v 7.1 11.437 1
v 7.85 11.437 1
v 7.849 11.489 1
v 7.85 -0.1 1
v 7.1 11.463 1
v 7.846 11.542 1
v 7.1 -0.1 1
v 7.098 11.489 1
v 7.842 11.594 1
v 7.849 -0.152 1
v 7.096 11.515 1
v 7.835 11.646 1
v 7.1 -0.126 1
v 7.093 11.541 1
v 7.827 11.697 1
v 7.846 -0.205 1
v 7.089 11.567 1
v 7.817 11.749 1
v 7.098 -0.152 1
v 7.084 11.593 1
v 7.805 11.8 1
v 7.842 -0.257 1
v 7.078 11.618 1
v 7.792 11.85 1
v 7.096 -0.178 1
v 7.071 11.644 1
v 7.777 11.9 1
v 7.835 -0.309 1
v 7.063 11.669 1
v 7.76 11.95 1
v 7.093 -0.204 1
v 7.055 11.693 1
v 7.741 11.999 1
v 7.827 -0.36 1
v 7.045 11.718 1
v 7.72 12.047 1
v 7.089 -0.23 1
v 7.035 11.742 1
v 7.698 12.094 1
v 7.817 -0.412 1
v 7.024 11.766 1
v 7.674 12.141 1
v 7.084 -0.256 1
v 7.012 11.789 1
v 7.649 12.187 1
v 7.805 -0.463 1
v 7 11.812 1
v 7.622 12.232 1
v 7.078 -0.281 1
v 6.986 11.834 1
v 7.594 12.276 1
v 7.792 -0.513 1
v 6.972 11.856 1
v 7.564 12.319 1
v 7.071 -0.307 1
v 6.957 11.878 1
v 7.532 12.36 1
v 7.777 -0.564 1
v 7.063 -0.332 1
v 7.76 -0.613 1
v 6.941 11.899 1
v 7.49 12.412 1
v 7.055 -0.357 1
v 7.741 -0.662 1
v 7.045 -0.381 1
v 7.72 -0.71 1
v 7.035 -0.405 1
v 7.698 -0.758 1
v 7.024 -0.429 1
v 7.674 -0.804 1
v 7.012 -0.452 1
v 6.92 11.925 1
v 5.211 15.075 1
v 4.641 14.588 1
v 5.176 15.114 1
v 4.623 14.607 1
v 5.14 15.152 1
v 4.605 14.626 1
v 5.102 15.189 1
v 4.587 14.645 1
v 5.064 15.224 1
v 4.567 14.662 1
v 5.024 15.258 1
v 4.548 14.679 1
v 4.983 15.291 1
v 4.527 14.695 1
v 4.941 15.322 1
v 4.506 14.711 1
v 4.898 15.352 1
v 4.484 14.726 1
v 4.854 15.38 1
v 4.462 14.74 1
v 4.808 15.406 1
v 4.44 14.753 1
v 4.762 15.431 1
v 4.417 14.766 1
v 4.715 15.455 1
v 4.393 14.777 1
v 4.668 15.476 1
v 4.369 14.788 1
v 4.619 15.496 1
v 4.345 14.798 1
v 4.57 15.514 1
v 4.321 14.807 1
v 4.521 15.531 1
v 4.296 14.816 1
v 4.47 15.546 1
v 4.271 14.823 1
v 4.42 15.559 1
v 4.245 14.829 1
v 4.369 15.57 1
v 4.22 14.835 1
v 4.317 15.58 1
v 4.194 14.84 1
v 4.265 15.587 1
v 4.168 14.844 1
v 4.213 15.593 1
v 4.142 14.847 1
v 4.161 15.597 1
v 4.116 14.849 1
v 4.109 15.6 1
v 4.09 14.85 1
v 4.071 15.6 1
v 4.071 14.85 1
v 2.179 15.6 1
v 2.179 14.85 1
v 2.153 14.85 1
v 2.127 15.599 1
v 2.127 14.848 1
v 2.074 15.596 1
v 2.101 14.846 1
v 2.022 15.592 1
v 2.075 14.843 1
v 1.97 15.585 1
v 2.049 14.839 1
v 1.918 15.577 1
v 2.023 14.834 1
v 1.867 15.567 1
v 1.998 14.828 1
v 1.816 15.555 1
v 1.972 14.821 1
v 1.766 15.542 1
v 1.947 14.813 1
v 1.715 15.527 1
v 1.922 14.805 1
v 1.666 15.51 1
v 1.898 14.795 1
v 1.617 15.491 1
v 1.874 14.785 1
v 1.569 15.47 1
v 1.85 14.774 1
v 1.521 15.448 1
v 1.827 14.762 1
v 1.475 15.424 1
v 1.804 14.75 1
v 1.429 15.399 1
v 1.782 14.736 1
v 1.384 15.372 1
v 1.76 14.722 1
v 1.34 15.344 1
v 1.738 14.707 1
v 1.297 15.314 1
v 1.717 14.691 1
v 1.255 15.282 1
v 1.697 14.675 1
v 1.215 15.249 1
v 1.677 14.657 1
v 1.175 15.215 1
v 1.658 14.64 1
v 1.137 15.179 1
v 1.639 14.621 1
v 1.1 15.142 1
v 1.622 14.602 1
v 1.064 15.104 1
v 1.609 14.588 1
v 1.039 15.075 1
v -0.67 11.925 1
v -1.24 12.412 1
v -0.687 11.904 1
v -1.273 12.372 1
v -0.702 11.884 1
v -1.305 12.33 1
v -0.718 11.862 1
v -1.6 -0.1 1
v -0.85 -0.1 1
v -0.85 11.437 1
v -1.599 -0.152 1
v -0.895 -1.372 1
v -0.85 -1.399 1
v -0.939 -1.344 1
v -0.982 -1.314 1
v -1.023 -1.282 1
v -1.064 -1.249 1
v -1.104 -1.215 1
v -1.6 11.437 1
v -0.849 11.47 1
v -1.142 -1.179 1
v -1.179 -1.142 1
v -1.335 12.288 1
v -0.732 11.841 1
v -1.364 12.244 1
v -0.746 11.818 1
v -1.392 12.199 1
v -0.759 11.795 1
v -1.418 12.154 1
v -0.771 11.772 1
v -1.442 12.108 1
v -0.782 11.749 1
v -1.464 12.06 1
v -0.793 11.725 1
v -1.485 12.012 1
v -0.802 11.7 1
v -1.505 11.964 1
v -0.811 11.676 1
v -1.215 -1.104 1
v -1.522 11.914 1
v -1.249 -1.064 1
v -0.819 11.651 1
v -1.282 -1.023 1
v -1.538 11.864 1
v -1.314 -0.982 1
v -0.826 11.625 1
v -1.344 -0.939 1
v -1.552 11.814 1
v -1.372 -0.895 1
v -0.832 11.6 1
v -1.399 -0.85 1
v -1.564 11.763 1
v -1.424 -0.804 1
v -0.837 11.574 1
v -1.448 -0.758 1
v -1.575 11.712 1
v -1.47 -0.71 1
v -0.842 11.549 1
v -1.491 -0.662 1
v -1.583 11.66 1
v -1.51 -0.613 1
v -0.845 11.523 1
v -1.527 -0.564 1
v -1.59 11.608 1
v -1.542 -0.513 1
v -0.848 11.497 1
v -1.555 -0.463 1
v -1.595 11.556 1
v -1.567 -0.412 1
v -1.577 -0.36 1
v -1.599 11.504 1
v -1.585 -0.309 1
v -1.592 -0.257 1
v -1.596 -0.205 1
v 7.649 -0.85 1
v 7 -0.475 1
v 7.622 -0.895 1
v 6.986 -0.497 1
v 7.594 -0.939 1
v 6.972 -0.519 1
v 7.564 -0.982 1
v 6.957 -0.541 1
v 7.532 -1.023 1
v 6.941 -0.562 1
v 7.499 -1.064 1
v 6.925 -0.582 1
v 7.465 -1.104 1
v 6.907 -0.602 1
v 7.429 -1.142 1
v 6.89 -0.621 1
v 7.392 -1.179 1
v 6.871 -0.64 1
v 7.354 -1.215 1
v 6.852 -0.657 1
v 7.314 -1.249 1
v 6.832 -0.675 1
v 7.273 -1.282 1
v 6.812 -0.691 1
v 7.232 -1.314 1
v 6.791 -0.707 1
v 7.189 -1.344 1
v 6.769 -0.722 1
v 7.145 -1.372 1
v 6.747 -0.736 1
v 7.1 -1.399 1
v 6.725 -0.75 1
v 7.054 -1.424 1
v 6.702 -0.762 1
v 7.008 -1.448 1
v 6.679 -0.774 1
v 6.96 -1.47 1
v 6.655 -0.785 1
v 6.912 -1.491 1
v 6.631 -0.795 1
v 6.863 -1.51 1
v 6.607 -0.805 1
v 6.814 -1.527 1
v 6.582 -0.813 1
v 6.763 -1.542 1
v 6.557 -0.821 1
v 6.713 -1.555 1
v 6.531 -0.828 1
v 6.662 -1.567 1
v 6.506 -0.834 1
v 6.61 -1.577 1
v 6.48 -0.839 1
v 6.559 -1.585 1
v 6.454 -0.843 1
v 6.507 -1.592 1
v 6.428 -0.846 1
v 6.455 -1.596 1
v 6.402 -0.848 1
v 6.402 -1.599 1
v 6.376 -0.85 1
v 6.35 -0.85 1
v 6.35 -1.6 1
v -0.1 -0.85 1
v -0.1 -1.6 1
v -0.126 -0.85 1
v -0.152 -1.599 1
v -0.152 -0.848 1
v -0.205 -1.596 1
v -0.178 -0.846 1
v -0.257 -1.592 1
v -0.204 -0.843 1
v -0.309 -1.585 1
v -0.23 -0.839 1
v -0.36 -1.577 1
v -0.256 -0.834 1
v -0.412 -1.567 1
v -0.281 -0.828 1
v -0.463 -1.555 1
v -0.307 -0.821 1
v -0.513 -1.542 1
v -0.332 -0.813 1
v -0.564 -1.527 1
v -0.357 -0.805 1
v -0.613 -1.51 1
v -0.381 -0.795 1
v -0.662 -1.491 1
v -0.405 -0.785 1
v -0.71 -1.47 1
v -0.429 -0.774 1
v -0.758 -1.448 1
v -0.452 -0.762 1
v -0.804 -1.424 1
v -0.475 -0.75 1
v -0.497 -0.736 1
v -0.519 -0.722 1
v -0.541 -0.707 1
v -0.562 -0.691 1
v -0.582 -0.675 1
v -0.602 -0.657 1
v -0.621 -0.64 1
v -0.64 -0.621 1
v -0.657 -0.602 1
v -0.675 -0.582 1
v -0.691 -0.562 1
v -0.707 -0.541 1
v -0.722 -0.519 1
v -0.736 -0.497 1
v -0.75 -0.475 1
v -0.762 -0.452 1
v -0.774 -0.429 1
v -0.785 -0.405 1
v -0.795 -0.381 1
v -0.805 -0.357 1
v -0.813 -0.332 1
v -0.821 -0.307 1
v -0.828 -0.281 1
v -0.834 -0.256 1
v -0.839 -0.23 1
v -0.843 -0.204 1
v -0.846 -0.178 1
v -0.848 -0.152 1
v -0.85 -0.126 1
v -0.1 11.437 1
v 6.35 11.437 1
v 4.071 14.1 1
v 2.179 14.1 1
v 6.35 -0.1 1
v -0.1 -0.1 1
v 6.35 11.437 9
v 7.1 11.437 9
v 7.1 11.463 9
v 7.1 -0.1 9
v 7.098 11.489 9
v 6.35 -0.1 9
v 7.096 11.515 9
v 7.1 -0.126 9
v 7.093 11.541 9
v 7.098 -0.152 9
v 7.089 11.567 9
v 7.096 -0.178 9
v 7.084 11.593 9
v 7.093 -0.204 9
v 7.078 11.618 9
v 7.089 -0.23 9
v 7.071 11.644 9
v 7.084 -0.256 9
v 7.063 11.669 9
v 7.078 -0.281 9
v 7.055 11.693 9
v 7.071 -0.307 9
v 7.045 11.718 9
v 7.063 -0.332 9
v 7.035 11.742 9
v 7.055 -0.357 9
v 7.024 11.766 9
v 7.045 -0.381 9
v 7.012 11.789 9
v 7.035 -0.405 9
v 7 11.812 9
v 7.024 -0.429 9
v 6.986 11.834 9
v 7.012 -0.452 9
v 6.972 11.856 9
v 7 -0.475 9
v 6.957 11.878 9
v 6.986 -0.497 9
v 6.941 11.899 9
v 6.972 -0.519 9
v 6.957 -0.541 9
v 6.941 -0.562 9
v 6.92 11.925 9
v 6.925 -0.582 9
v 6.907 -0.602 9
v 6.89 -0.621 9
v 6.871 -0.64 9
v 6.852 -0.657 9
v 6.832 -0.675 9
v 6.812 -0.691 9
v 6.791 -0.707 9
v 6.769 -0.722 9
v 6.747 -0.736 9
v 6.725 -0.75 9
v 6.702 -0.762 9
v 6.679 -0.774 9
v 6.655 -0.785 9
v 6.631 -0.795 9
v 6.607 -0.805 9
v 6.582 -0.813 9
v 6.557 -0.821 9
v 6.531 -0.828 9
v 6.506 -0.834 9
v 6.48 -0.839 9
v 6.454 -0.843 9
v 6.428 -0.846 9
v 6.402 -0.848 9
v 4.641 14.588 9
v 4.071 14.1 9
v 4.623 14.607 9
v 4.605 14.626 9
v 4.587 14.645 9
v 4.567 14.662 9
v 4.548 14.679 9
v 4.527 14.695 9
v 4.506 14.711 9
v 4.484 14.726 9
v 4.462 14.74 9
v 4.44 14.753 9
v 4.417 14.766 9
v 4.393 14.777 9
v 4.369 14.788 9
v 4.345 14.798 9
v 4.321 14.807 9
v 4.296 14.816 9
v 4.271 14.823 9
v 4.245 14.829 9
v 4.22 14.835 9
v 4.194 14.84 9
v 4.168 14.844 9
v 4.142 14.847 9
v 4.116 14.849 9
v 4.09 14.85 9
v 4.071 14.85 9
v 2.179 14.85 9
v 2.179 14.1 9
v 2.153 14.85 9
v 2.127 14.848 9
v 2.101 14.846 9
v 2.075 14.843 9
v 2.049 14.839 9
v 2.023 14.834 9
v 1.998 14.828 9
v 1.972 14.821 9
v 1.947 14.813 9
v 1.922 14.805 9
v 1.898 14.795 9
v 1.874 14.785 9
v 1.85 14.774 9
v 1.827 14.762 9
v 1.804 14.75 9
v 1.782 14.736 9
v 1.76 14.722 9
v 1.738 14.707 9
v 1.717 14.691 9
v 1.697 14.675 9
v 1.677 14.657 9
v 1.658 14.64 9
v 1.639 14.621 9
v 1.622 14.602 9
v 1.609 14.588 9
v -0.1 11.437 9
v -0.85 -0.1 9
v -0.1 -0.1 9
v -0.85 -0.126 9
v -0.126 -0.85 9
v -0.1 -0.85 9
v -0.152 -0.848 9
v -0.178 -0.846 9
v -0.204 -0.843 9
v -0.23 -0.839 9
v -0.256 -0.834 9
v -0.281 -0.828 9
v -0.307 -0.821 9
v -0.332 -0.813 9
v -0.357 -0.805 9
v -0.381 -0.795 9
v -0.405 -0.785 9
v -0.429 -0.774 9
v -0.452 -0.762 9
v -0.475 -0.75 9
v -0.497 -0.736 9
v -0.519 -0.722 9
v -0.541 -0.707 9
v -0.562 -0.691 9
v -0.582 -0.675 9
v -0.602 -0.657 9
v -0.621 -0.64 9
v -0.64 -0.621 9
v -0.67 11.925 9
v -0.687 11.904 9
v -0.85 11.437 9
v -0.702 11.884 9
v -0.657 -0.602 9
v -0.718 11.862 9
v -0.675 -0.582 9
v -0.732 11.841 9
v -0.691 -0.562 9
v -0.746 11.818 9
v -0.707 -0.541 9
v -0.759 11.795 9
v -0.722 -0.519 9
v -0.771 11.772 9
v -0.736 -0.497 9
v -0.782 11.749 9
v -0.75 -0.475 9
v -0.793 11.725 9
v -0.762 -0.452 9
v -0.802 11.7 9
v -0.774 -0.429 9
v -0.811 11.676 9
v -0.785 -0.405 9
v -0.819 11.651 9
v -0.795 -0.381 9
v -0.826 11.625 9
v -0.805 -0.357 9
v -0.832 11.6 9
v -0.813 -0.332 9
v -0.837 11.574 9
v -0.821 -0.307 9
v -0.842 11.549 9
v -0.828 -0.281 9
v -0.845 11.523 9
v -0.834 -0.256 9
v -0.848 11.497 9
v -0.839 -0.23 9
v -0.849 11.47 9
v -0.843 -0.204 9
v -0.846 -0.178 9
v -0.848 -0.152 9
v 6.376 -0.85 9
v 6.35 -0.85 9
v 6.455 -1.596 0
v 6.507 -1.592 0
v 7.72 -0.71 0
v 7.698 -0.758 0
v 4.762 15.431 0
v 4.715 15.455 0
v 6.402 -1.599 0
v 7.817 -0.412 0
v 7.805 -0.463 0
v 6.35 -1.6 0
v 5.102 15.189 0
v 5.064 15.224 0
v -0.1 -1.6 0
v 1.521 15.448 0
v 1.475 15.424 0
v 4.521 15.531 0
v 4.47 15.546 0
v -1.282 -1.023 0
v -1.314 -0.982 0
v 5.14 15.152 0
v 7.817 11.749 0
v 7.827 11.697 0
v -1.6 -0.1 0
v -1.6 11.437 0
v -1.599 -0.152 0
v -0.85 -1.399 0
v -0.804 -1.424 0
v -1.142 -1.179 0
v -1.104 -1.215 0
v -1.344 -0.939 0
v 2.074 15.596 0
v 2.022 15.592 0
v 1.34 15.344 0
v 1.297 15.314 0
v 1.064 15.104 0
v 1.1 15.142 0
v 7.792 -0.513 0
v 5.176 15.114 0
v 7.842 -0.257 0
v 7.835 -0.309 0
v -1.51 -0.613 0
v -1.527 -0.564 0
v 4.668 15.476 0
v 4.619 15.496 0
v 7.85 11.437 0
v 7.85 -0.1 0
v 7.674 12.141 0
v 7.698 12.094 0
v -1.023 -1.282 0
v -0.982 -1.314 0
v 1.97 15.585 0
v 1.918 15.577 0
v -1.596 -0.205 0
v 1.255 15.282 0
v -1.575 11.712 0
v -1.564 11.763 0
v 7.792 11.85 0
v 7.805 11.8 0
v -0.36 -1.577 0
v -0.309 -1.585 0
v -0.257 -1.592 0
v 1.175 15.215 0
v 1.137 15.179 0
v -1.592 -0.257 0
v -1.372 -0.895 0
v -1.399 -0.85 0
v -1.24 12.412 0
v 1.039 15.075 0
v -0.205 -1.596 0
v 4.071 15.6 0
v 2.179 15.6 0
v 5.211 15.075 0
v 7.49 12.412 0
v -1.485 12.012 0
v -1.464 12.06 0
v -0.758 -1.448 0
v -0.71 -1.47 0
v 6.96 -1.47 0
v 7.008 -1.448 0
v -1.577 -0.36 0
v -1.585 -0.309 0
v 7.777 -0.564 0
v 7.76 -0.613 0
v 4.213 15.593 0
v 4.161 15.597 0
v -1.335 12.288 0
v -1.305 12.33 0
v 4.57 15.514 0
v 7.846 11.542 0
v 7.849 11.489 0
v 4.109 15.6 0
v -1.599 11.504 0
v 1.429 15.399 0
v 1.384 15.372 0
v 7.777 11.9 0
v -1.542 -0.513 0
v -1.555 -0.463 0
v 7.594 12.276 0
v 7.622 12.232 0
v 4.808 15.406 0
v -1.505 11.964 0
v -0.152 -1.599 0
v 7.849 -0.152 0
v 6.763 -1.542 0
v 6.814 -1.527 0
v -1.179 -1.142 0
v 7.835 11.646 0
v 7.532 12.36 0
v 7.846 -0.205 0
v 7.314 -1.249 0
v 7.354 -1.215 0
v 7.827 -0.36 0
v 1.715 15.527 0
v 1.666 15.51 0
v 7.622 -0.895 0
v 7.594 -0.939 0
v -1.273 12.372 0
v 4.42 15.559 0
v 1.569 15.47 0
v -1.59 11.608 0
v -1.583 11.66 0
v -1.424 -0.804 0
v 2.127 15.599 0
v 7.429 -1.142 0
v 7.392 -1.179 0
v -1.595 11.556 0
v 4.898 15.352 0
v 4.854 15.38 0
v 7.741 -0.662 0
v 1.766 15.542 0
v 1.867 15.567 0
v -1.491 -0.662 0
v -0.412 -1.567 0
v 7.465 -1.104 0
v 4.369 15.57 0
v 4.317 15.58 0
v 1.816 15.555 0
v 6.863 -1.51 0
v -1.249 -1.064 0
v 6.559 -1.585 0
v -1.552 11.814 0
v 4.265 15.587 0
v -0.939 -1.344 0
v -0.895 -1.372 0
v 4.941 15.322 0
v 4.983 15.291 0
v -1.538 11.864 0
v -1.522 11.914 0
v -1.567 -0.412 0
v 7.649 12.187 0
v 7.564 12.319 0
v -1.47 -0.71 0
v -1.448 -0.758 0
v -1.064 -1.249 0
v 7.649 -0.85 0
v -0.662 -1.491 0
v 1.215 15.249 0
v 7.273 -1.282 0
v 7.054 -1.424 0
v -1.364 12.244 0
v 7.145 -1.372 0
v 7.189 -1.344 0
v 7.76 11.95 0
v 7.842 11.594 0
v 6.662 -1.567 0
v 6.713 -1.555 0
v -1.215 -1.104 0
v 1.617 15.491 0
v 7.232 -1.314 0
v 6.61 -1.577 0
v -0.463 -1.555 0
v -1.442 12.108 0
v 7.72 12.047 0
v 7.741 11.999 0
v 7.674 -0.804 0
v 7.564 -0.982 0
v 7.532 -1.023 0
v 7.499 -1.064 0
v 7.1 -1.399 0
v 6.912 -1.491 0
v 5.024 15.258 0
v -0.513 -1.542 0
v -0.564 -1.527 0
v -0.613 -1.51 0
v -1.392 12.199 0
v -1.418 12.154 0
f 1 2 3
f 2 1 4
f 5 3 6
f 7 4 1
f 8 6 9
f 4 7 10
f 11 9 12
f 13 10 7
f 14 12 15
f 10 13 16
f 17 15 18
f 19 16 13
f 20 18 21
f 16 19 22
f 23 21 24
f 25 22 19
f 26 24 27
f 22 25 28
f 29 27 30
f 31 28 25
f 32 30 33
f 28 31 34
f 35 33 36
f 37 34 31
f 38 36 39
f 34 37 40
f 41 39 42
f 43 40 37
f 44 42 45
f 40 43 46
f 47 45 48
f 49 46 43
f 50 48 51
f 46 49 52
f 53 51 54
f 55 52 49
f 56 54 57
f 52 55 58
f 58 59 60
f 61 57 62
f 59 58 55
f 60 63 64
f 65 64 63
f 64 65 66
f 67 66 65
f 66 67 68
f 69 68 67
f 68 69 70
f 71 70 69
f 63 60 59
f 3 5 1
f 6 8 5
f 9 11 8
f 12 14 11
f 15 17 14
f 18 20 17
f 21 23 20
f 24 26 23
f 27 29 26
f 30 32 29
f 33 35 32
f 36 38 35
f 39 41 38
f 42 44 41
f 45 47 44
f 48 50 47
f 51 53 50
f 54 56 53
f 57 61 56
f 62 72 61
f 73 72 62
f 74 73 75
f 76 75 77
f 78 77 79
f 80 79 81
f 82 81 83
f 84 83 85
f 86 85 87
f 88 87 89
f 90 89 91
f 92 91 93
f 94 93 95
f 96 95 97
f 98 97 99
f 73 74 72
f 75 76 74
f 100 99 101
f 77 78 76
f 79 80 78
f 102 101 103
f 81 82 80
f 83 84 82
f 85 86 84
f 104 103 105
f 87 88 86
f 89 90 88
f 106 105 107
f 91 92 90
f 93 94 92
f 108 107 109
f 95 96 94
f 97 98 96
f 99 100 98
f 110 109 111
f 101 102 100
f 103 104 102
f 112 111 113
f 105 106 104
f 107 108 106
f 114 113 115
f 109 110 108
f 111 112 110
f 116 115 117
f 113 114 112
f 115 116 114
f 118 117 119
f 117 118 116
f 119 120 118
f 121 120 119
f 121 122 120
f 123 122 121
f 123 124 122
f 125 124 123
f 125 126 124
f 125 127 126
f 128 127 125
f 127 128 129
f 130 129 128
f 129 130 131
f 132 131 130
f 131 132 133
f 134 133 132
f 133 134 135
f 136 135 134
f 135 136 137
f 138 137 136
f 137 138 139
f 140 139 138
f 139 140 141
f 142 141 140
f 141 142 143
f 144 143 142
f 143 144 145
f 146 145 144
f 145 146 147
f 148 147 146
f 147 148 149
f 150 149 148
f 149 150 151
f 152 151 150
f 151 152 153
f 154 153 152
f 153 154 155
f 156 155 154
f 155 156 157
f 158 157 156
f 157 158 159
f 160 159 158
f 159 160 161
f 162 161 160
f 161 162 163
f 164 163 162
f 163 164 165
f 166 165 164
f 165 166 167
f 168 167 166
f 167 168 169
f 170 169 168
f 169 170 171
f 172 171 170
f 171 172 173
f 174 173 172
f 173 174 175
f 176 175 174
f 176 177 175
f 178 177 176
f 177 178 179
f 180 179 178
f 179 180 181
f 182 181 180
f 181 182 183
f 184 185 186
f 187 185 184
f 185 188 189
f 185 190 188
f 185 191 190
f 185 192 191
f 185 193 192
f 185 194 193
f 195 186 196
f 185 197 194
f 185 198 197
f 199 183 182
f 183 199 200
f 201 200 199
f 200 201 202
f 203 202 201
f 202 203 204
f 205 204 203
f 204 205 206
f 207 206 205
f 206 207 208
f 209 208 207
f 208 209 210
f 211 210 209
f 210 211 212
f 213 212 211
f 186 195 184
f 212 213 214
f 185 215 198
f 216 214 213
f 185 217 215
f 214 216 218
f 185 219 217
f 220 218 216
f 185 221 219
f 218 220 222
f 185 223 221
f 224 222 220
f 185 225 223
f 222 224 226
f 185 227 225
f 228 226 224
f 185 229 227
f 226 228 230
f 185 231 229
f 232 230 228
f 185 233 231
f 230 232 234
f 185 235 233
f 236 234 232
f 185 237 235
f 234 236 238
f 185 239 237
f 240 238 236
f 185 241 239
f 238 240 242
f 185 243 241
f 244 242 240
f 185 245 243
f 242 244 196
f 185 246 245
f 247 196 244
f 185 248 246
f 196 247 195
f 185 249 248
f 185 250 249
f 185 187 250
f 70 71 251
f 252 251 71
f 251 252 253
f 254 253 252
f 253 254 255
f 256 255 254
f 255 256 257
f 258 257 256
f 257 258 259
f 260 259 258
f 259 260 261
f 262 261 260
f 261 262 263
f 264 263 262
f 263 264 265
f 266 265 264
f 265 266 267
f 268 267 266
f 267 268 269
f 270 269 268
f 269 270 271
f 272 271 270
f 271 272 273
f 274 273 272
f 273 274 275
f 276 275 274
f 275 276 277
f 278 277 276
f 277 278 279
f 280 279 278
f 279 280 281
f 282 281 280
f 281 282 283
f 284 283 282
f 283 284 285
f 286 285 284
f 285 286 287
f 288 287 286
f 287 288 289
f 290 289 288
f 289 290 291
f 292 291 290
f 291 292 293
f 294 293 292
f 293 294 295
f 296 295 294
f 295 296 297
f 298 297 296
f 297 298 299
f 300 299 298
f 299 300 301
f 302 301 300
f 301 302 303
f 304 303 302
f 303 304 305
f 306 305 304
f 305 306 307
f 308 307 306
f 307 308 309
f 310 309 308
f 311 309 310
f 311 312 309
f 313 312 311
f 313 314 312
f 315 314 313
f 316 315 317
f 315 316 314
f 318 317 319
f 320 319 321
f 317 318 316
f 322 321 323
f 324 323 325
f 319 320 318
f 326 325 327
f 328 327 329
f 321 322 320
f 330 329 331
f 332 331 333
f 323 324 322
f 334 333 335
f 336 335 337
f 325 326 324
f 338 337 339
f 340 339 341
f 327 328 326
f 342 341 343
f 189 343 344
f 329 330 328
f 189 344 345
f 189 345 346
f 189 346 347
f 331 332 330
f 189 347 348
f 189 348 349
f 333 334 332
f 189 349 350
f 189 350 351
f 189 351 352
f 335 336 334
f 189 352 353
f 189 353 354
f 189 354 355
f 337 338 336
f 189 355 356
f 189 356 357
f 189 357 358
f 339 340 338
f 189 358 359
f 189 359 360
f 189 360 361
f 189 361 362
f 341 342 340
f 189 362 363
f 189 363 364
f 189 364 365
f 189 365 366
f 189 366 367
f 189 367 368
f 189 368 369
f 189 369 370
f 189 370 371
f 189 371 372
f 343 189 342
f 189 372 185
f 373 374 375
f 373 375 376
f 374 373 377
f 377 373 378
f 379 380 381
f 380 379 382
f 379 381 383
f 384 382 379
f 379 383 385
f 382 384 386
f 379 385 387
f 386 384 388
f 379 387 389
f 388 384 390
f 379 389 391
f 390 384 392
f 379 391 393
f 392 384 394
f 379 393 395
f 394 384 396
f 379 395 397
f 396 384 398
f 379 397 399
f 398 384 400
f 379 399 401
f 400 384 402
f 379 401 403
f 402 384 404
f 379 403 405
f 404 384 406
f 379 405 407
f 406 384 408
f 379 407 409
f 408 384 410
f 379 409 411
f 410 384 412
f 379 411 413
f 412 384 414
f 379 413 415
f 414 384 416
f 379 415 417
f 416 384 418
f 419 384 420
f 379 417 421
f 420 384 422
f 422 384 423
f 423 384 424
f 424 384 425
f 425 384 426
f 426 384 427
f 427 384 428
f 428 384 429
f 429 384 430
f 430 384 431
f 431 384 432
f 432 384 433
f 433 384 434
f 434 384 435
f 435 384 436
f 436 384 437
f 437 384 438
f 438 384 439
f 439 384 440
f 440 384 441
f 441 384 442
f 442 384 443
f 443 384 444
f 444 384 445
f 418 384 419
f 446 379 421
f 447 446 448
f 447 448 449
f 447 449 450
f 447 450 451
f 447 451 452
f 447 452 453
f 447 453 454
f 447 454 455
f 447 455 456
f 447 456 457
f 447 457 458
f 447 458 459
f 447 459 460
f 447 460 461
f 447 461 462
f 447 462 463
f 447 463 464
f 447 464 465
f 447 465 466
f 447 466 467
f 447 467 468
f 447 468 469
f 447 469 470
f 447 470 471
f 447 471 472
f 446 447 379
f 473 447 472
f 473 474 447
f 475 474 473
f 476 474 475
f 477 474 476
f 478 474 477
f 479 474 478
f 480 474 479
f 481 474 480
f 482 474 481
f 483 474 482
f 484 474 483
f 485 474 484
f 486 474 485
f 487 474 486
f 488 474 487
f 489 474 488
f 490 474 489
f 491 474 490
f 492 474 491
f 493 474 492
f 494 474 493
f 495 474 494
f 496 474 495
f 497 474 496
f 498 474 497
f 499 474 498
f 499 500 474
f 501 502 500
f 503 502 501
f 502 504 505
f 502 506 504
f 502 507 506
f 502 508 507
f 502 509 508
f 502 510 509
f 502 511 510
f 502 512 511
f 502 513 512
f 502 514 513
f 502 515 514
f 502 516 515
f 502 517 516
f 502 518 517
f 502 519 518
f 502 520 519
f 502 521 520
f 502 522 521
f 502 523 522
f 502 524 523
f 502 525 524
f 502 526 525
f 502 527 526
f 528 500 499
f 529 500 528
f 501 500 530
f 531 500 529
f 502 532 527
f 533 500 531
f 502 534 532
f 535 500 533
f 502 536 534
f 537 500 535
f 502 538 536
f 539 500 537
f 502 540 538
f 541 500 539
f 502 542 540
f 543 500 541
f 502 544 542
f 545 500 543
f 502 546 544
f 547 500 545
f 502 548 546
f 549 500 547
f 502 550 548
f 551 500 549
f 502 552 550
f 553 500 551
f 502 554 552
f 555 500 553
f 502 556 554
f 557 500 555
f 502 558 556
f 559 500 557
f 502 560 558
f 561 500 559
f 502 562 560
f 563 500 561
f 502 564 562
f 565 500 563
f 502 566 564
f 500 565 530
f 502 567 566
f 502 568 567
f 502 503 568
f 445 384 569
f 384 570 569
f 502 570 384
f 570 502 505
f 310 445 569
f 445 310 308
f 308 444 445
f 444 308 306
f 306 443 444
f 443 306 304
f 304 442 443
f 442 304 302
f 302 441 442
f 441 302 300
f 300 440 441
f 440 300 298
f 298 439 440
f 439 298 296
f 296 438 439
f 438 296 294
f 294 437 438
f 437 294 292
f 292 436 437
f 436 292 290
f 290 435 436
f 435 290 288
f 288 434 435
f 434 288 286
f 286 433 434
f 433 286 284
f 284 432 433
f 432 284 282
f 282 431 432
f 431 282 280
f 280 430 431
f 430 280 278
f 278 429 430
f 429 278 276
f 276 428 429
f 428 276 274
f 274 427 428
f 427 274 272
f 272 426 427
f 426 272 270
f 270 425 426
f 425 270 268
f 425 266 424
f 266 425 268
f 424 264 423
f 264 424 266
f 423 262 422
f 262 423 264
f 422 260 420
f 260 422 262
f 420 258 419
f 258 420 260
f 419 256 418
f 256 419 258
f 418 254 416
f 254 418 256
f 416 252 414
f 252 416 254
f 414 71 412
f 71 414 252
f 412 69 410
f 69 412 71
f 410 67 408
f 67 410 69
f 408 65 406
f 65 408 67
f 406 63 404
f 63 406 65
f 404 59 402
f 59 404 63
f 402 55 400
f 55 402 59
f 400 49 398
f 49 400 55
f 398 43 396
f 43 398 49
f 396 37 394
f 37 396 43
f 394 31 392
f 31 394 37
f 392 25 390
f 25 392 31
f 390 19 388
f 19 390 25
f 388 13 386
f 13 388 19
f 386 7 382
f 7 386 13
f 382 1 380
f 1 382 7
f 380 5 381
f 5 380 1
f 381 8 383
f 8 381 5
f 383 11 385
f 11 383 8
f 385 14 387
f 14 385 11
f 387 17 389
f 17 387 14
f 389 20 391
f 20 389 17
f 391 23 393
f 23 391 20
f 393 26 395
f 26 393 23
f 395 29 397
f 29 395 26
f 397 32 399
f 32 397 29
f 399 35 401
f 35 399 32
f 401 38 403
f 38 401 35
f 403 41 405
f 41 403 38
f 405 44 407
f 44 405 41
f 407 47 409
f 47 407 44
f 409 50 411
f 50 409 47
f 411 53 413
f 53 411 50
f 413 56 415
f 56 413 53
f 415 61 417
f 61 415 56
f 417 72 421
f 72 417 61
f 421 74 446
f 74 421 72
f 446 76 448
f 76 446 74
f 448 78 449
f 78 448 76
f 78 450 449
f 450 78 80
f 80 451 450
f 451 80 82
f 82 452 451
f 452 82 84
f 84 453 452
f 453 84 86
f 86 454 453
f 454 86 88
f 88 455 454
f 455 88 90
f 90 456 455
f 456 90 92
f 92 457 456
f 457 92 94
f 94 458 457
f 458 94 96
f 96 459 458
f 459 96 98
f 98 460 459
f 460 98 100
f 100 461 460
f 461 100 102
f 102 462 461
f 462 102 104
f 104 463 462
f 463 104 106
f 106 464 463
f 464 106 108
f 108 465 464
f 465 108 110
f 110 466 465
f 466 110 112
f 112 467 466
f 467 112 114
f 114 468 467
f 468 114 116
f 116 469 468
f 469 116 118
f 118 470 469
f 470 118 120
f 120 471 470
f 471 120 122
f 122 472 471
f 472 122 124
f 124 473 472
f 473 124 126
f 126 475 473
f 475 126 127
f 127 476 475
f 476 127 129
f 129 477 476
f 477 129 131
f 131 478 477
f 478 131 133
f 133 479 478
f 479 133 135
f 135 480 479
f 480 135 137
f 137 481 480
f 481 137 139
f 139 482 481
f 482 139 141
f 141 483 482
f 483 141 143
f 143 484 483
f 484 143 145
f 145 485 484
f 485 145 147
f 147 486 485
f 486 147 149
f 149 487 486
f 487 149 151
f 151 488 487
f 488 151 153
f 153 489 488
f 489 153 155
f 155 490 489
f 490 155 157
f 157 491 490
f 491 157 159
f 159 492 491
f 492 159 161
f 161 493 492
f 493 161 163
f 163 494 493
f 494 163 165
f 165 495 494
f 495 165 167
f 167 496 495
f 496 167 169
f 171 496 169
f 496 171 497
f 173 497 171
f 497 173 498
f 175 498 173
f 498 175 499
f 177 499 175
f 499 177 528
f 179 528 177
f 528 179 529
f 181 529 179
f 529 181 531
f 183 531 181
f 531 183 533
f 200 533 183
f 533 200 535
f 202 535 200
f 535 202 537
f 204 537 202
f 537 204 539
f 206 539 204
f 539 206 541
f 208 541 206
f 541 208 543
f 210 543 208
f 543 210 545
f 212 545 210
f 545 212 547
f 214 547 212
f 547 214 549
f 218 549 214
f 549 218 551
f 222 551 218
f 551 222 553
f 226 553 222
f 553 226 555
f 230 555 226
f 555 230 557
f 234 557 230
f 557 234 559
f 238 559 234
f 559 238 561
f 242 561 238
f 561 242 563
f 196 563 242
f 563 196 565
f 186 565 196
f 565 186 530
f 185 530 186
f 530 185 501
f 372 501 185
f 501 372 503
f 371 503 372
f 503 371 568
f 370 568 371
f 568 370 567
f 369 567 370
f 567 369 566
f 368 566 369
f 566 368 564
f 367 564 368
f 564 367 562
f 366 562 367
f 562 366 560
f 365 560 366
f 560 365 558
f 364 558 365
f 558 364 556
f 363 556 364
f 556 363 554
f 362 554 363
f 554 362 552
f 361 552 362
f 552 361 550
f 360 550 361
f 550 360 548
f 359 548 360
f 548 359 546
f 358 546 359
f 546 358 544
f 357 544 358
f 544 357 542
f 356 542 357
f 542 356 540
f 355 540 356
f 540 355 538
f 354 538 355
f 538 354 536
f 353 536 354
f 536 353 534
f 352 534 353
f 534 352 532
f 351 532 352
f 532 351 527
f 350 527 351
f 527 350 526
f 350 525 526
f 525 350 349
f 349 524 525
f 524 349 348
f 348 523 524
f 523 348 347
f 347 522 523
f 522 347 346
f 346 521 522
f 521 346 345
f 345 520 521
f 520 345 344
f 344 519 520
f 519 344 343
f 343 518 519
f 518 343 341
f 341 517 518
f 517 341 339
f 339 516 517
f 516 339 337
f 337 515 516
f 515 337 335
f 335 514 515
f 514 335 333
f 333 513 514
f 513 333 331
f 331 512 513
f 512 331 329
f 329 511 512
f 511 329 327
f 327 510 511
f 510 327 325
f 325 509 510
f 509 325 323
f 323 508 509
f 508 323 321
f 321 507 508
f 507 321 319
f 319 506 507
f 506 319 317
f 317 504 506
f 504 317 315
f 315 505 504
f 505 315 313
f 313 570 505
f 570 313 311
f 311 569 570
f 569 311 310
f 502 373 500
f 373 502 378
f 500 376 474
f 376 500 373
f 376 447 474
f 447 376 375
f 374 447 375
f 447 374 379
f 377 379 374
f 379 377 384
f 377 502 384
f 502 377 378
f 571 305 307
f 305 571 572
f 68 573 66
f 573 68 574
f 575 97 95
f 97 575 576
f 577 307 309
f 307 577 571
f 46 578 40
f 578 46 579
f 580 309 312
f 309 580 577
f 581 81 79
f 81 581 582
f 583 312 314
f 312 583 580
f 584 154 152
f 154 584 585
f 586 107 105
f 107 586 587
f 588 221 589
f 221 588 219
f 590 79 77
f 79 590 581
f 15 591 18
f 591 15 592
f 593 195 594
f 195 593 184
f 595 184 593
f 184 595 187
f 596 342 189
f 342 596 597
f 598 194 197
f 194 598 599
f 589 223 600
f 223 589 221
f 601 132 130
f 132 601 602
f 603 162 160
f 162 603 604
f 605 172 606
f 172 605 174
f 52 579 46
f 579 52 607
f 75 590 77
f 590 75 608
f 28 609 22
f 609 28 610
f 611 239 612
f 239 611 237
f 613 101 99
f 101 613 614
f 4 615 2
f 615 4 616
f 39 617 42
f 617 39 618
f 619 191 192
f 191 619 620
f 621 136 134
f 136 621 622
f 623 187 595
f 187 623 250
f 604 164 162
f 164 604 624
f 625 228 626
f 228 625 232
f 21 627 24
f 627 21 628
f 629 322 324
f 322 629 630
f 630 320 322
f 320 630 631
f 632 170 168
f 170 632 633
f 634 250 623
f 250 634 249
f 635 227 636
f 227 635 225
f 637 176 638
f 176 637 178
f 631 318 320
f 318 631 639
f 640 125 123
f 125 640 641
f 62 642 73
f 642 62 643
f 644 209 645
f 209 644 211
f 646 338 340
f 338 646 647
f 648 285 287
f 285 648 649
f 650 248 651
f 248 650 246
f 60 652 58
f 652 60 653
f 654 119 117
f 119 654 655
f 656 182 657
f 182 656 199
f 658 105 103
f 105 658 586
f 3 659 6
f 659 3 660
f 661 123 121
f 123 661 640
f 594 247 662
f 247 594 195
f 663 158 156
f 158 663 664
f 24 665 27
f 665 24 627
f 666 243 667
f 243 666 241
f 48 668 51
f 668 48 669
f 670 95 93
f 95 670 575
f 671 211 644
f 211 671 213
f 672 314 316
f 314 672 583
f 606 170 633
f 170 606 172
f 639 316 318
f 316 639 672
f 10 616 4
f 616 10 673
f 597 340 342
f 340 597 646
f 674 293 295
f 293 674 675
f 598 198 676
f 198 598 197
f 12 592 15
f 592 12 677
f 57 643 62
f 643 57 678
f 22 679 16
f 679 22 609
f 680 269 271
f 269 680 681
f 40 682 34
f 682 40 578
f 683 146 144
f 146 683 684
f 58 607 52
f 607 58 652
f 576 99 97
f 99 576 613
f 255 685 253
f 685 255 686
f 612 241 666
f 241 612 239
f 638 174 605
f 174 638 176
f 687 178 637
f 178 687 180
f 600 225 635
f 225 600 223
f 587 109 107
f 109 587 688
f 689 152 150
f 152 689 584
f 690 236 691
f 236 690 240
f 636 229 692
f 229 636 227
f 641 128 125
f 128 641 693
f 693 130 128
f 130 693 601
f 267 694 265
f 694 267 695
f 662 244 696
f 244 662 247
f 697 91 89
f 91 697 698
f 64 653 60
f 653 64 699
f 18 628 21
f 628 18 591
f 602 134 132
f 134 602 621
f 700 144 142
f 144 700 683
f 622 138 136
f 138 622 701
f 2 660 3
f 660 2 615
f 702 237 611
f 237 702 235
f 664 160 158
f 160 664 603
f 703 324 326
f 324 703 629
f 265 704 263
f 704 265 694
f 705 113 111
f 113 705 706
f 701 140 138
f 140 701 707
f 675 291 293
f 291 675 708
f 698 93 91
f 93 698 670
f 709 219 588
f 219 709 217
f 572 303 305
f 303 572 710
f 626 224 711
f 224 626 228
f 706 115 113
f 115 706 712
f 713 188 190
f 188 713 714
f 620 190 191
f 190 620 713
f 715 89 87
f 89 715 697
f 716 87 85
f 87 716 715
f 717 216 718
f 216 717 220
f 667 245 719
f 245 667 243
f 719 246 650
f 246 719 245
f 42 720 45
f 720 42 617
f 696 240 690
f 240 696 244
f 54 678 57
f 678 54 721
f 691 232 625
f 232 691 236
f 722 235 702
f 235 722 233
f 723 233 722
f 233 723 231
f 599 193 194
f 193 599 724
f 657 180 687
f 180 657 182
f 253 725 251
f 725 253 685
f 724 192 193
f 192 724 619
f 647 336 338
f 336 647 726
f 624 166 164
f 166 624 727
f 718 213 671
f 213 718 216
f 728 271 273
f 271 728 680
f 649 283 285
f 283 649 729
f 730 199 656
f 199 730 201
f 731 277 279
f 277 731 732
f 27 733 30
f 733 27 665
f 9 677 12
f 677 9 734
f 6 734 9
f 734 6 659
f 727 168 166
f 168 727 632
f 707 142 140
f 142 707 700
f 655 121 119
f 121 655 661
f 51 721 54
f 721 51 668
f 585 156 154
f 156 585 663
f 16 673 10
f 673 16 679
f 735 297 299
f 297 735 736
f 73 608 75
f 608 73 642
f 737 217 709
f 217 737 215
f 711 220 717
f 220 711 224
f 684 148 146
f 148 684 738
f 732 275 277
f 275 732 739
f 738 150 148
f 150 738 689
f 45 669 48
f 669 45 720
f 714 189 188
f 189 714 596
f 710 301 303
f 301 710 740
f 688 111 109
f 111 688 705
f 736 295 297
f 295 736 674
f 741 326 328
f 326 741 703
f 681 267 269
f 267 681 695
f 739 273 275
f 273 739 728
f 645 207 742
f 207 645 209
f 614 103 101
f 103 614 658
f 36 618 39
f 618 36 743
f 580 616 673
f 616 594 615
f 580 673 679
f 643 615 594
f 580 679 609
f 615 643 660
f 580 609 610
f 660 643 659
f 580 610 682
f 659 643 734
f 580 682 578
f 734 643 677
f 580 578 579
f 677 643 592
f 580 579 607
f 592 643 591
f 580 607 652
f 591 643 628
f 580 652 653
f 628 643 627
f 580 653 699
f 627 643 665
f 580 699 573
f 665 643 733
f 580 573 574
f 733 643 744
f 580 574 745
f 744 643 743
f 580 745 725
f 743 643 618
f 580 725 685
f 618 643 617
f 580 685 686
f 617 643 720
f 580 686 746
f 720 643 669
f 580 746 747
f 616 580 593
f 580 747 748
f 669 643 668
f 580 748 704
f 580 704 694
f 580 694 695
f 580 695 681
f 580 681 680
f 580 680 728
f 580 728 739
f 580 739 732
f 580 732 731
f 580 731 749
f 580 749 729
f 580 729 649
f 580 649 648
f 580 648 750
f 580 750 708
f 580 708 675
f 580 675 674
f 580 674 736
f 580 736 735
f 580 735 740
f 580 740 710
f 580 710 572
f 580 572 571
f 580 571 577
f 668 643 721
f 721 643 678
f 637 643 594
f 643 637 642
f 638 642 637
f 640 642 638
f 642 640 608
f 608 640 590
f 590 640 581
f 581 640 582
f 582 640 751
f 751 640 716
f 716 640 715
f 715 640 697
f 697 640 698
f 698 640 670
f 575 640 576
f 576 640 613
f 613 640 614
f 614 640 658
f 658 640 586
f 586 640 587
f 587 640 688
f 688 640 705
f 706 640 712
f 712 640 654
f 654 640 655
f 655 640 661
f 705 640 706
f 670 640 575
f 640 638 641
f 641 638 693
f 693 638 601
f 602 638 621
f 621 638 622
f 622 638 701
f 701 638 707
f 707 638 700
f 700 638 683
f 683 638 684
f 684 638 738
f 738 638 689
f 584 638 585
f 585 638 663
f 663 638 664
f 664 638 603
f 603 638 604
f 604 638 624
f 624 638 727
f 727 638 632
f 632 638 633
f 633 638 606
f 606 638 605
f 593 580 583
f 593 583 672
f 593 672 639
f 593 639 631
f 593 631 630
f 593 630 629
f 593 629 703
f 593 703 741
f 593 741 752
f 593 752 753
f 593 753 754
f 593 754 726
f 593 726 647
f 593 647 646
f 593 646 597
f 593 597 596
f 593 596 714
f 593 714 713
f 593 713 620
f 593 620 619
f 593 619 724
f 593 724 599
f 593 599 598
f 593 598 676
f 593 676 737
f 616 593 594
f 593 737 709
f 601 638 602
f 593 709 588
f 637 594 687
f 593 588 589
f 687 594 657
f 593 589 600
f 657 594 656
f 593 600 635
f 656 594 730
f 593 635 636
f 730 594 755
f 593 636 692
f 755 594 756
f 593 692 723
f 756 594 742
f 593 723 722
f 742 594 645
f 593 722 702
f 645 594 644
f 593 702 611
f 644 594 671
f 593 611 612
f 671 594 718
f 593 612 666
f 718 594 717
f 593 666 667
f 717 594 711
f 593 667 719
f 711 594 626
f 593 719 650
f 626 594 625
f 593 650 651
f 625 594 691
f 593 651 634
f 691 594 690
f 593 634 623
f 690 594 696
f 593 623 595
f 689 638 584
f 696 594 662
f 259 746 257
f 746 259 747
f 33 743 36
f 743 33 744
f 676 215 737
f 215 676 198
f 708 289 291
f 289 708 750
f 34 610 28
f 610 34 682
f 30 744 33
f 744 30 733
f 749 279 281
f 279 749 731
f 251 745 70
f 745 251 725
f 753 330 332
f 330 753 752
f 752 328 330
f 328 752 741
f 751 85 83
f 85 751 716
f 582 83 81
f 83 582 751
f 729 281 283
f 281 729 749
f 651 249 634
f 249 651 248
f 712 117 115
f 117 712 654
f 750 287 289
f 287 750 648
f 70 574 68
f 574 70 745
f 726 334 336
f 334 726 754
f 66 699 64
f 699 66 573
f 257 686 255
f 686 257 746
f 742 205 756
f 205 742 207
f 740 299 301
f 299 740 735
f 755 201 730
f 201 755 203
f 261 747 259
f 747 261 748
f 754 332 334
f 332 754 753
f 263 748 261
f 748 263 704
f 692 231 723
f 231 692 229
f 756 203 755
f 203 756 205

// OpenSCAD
w = 6.25;
wt = 1.8;
l1 = 11.4;
lo = 14;
h = 8;
$fa = 2;
$fs = 0.02;

module xtfoot() {
    offset(delta=.1) // give it a bit of wiggle room.
        polygon([[0, 0], [w, 0], [w, l1],
            [w/2 + wt/2, lo], [w/2 - wt/2, lo], [0, l1]]);
}

module xterior(thickness) {
    linear_extrude(h) {
        difference() {
            offset(thickness) xtfoot();
            xtfoot();
        }
    }
}

module xt60() {
    translate([0, 0, 1]) xterior(.75);
    linear_extrude(1) offset(1.5) xtfoot();
}

xt60();
